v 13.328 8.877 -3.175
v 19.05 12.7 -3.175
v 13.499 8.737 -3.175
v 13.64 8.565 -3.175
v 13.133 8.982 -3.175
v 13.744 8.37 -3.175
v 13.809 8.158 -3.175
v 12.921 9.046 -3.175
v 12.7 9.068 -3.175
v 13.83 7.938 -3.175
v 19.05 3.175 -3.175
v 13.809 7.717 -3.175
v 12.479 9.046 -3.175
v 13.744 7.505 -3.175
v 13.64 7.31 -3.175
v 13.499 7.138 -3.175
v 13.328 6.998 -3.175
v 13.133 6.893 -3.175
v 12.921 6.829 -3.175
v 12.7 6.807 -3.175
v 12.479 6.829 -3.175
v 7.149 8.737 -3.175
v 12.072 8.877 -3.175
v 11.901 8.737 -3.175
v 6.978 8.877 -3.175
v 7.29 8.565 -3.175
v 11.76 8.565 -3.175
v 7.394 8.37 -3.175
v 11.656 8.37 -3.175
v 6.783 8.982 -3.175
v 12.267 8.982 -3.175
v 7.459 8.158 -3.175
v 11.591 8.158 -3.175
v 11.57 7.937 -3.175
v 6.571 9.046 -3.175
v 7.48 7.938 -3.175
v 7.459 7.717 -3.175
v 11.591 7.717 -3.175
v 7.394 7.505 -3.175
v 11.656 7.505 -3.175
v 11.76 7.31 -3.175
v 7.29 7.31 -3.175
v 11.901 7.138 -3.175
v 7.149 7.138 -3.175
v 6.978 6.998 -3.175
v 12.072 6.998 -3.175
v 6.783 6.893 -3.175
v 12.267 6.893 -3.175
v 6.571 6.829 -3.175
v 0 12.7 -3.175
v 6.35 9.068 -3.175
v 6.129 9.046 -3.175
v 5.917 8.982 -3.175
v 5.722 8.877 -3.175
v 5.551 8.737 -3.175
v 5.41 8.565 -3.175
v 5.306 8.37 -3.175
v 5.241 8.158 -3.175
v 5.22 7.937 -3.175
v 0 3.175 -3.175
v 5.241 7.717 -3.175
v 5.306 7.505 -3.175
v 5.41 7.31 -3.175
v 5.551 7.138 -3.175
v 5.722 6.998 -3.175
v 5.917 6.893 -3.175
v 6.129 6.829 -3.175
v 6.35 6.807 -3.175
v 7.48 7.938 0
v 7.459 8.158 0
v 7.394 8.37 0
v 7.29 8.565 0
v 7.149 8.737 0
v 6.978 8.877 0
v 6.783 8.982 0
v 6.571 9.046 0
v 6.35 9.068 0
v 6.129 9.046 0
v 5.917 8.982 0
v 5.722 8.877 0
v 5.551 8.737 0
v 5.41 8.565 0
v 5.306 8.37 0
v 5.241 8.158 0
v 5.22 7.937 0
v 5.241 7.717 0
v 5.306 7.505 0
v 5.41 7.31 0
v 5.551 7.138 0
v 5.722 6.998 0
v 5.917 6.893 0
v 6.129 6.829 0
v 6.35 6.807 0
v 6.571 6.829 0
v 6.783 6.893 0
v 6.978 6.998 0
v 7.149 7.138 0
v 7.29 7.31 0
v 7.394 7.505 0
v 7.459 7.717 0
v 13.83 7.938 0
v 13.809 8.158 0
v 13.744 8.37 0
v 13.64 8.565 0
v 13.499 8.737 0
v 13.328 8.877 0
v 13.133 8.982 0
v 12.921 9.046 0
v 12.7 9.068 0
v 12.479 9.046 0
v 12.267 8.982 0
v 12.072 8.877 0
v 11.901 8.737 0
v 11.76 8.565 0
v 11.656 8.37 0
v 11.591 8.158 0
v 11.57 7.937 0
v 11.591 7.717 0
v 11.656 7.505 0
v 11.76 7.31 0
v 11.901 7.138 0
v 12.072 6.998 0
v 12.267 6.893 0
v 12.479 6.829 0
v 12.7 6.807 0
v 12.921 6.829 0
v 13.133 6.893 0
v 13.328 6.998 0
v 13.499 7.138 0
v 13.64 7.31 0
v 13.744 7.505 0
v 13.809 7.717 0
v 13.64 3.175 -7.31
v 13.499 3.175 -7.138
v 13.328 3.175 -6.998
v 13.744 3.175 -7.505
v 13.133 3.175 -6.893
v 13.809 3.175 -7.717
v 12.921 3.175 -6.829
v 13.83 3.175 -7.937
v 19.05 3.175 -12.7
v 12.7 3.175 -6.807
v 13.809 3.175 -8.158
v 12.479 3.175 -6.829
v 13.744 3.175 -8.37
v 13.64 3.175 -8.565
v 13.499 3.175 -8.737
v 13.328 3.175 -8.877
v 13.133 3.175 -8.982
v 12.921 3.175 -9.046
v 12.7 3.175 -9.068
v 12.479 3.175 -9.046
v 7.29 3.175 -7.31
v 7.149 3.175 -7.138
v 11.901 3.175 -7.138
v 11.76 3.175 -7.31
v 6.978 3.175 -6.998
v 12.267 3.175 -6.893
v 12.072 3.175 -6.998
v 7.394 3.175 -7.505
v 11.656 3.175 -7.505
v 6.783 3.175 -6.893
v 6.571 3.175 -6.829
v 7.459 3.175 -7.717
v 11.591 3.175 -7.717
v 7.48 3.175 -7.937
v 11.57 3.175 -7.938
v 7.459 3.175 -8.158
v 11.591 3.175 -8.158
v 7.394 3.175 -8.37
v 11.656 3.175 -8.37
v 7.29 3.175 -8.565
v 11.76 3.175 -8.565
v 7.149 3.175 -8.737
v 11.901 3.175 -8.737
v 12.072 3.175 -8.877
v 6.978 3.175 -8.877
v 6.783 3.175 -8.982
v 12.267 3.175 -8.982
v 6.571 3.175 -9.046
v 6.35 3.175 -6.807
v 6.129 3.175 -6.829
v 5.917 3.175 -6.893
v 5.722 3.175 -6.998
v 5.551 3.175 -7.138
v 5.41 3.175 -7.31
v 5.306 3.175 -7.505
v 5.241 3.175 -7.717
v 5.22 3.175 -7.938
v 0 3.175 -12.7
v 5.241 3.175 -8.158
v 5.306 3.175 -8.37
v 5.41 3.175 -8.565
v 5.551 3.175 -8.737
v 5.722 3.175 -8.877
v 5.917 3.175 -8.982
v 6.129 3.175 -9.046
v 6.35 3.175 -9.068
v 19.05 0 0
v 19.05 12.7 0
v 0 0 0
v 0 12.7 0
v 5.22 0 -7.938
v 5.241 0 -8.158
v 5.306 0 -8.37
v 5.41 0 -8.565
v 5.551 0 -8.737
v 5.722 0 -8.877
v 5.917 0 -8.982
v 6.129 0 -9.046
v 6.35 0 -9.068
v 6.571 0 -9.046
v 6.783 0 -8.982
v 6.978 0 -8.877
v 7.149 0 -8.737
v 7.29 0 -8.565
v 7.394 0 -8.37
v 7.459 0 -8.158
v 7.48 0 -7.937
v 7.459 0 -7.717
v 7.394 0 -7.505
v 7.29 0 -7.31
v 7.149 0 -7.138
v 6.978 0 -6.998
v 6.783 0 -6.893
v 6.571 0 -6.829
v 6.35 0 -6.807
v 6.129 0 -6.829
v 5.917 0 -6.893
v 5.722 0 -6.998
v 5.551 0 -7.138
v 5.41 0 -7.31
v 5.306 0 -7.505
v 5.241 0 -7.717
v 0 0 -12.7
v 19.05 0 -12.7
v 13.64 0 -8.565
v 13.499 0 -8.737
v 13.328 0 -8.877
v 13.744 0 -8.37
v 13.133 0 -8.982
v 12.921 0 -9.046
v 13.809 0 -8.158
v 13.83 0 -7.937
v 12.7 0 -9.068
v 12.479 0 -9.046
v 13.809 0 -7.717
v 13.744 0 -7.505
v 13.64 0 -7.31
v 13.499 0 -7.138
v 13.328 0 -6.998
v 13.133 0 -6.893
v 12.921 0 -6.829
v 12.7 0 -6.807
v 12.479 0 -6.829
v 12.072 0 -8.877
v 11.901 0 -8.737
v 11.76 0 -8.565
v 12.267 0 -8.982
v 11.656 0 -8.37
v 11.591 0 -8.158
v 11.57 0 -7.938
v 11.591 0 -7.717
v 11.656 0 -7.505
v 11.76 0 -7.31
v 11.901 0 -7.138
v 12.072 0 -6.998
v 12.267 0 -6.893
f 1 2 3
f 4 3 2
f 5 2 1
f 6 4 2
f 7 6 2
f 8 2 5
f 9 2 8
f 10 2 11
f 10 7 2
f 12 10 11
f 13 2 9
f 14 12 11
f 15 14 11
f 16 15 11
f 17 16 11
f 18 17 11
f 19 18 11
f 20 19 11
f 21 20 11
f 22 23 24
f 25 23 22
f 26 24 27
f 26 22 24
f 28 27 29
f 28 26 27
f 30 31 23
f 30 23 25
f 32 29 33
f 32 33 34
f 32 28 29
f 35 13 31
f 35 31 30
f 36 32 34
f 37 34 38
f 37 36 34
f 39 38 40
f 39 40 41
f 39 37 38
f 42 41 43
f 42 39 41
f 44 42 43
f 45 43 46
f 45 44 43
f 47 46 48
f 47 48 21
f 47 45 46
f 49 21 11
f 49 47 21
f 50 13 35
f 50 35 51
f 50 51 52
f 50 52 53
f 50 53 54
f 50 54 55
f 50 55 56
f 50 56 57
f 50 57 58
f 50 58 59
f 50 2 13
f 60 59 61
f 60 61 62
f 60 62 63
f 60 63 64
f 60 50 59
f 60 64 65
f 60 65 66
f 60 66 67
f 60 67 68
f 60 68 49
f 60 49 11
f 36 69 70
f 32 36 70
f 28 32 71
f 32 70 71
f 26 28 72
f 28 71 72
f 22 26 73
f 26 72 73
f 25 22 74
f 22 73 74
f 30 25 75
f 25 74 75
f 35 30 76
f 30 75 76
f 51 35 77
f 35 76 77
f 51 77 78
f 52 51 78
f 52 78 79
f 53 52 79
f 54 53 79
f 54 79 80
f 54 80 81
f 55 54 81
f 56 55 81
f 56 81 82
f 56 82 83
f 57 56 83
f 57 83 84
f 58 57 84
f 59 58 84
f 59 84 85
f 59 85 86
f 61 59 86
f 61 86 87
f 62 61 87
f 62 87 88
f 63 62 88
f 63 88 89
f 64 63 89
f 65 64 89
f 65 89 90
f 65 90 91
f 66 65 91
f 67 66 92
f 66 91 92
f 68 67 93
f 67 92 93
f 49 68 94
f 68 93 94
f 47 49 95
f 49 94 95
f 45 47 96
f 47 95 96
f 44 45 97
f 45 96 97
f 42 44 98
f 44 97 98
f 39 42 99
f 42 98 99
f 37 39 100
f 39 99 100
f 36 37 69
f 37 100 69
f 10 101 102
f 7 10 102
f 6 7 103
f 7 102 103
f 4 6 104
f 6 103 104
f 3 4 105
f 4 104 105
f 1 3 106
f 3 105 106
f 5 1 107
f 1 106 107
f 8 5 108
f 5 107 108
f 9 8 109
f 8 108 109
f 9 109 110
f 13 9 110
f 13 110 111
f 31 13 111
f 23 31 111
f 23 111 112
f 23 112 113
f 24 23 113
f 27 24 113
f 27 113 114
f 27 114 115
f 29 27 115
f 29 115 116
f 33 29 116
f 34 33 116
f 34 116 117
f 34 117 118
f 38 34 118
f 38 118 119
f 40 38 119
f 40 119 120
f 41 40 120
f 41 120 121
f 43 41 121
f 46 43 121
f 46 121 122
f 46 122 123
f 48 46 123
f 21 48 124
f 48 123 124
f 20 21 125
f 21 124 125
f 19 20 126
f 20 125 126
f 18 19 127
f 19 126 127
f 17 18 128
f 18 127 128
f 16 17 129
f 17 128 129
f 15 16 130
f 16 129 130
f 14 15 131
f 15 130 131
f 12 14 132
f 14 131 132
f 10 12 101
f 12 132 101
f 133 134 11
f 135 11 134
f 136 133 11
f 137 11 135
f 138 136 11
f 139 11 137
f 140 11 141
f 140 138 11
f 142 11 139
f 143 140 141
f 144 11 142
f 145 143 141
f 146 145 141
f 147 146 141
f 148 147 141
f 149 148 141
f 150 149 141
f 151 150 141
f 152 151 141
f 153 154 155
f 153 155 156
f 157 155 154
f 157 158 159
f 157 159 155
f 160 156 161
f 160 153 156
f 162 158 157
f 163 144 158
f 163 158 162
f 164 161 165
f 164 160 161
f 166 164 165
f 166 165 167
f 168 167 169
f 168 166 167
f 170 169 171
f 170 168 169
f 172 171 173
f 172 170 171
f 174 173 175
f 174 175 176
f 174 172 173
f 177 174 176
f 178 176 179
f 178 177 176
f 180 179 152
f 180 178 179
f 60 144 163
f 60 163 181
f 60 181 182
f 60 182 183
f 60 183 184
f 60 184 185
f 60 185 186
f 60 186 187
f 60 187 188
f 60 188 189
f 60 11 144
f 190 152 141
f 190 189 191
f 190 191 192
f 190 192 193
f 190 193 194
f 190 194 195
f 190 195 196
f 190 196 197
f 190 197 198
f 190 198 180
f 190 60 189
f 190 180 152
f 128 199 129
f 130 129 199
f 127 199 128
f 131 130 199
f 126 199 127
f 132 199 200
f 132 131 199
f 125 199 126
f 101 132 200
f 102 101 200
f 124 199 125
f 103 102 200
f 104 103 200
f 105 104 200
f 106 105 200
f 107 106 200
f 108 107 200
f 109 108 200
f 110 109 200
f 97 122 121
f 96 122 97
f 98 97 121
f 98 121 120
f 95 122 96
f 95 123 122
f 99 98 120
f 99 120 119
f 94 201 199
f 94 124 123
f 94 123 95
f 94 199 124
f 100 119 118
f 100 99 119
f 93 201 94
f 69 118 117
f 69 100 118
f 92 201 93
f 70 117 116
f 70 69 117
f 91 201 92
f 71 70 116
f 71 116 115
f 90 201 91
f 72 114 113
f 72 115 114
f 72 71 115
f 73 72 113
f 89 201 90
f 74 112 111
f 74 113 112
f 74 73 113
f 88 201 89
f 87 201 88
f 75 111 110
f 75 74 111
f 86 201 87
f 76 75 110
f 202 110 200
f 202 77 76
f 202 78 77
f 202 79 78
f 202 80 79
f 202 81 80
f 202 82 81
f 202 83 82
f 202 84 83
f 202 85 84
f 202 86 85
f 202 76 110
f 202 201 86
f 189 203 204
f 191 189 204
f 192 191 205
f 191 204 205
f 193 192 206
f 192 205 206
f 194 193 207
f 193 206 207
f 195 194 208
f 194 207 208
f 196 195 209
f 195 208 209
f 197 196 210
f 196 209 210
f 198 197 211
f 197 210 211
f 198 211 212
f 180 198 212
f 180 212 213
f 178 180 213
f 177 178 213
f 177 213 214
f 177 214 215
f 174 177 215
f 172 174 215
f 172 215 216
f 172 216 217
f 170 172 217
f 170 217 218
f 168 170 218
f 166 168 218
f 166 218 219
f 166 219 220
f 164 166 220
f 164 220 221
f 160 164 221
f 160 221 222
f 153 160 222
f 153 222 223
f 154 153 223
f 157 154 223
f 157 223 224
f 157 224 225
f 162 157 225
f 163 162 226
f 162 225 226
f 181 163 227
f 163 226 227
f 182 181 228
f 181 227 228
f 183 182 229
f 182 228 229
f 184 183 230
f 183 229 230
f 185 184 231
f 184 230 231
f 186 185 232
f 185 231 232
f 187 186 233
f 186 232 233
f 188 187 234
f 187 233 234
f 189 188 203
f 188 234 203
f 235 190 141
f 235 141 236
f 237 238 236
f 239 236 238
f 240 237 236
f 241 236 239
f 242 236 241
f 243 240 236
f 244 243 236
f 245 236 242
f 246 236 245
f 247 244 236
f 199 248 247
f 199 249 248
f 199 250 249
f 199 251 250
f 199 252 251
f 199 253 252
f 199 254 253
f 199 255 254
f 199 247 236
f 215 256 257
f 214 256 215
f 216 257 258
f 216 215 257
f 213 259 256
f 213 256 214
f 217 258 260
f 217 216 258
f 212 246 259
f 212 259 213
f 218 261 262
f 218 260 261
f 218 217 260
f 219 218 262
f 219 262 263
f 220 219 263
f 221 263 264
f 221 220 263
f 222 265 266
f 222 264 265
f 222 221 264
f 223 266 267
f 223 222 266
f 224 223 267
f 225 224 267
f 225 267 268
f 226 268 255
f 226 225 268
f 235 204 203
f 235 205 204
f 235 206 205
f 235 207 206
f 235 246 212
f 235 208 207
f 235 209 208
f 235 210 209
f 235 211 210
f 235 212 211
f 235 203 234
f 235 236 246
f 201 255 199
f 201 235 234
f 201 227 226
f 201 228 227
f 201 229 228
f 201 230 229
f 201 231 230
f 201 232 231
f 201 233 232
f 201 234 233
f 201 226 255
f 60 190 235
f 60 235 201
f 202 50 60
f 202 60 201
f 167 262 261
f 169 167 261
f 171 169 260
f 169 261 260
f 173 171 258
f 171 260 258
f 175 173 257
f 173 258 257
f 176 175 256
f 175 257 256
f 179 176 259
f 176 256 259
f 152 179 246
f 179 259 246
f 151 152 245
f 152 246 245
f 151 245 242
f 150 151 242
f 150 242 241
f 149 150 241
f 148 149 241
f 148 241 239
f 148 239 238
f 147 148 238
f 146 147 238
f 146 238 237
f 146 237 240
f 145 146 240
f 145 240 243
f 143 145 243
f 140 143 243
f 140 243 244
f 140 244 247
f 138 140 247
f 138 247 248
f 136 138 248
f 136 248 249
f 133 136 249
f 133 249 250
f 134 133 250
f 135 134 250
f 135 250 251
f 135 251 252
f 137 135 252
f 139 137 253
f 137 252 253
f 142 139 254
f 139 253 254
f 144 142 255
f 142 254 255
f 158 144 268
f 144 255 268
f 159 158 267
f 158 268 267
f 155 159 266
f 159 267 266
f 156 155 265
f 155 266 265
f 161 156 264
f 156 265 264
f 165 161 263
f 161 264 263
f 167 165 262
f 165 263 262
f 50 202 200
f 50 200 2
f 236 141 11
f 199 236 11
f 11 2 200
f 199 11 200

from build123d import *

# Parameters (mm, degrees)
BOSS_EXTRUDE1_DEPTH             = 19.05
F_43_0_089_DIAMETER_HOLE1_D     = 2.2606
F_43_0_089_DIAMETER_HOLE1_DEPTH = 25.4
F_43_0_089_DIAMETER_HOLE1_TIP   = 0.679152758
F_43_0_089_DIAMETER_HOLE2_D     = 2.2606
F_43_0_089_DIAMETER_HOLE2_DEPTH = 25.4
F_43_0_089_DIAMETER_HOLE2_TIP   = 0.679152758


with BuildPart() as part:
    # Sketch1 → Boss-Extrude1 (new body)
    with BuildSketch(Plane(origin=(0, 0, 0), x_dir=(0, 0, -1), z_dir=(1, 0, 0))):
        Polygon((0, 0), (0, 12.7), (3.175, 12.7), (3.175, 3.175), (12.7, 3.175), (12.7, 0), align=None)
    extrude(amount=BOSS_EXTRUDE1_DEPTH)

    # #43 (0.089) Diameter Hole1
    with Locations(Plane(origin=(0, 0, -3.175), x_dir=(-1, 0, 0), z_dir=(0, 0, -1))):
        with Locations((-6.35, 7.9375), (-12.7, 7.9375)):
            Hole(F_43_0_089_DIAMETER_HOLE1_D / 2, depth=F_43_0_089_DIAMETER_HOLE1_DEPTH)
            with Locations((0, 0, -(F_43_0_089_DIAMETER_HOLE1_DEPTH + F_43_0_089_DIAMETER_HOLE1_TIP / 2))):  # 118° drill point
                Cone(0, F_43_0_089_DIAMETER_HOLE1_D / 2, F_43_0_089_DIAMETER_HOLE1_TIP, mode=Mode.SUBTRACT)

    # #43 (0.089) Diameter Hole2
    with Locations(Plane(origin=(0, 3.175, 0), x_dir=(1, 0, 0), z_dir=(0, 1, 0))):
        with Locations((6.35, 7.9375), (12.7, 7.9375)):
            Hole(F_43_0_089_DIAMETER_HOLE2_D / 2, depth=F_43_0_089_DIAMETER_HOLE2_DEPTH)
            with Locations((0, 0, -(F_43_0_089_DIAMETER_HOLE2_DEPTH + F_43_0_089_DIAMETER_HOLE2_TIP / 2))):  # 118° drill point
                Cone(0, F_43_0_089_DIAMETER_HOLE2_D / 2, F_43_0_089_DIAMETER_HOLE2_TIP, mode=Mode.SUBTRACT)


solid = part.part
